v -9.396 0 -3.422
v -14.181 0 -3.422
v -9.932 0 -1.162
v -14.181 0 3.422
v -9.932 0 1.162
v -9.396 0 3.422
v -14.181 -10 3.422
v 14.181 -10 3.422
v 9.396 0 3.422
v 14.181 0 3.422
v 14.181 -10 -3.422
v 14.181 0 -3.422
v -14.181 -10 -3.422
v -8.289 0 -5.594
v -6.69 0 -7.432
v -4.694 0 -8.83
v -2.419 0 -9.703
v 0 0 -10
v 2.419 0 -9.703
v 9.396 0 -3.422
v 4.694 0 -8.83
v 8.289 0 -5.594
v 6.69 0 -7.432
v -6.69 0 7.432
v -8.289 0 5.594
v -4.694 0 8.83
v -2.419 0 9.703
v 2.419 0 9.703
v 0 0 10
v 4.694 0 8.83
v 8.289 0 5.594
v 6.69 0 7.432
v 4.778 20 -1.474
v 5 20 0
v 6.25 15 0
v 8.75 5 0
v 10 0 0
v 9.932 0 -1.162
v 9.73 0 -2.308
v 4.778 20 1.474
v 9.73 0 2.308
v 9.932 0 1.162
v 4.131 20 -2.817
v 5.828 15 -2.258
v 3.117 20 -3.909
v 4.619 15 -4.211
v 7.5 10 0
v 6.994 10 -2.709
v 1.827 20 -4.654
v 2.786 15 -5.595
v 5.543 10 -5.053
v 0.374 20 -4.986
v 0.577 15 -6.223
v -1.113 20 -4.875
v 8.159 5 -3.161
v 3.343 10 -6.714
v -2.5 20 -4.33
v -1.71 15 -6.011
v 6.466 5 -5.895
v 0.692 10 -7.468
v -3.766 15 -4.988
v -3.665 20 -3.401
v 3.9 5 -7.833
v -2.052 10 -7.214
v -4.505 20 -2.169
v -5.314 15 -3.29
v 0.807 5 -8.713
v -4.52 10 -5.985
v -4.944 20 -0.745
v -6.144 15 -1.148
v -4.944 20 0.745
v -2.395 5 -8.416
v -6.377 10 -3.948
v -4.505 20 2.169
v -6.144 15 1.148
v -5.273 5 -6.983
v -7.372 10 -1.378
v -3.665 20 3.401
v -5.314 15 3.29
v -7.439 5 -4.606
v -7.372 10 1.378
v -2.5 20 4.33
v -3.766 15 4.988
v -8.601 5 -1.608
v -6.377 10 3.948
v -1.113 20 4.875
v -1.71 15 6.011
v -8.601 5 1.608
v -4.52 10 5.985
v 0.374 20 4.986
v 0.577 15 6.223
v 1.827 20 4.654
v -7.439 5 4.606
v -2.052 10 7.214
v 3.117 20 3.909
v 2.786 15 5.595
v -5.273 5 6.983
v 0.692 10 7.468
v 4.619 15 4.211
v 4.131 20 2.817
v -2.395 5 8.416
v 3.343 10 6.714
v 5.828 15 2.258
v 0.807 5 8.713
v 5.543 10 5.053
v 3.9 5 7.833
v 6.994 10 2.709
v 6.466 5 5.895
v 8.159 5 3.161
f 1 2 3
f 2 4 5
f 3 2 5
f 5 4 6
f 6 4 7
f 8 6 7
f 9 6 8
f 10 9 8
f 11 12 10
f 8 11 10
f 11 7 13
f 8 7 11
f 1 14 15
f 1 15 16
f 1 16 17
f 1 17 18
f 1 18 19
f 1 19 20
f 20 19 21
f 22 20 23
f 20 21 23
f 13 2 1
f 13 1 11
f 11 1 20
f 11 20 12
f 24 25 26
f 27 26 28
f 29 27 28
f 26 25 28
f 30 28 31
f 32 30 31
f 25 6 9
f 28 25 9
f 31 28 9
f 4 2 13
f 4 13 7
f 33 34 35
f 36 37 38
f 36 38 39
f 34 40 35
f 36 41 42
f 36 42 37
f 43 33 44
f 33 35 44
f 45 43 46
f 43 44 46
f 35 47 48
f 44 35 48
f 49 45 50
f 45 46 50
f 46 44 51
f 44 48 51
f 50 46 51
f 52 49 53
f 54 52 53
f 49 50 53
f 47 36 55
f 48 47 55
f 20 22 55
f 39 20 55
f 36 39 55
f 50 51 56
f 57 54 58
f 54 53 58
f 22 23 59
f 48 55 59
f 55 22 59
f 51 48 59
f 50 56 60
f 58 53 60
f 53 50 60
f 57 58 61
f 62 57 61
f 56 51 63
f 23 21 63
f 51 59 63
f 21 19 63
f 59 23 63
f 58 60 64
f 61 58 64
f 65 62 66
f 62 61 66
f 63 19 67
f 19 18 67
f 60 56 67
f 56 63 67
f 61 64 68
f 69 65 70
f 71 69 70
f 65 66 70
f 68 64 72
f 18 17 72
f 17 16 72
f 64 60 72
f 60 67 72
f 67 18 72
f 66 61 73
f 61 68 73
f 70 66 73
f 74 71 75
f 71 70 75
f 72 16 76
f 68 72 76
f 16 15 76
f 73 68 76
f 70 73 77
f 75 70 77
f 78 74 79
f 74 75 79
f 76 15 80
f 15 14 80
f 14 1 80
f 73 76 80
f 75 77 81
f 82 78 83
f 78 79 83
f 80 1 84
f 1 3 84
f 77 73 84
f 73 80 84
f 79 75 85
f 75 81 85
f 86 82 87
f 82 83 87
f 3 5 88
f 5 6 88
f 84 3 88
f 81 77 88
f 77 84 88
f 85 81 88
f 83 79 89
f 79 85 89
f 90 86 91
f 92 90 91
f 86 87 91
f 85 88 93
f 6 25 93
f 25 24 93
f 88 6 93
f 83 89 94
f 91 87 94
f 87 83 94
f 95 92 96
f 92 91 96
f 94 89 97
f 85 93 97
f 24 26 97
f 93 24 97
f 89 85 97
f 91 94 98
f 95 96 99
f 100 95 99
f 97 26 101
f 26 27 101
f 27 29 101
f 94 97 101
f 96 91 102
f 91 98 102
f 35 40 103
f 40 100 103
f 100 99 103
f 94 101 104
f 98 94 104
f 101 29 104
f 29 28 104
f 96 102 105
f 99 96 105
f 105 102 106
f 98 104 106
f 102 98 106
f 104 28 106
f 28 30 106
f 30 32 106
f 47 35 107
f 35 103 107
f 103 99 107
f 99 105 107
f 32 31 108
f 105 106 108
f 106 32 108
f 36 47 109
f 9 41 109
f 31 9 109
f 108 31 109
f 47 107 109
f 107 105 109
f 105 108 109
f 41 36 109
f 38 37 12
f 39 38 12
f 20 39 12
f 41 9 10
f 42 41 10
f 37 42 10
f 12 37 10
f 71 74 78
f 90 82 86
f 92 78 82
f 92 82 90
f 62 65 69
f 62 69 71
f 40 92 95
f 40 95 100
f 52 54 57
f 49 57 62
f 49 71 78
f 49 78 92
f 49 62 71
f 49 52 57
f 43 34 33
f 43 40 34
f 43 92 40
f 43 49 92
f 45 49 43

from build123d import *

# Parameters (mm, degrees)
SKETCH2_R           = 5
SKETCH1_R           = 10
SKETCH3_W           = 28.361759846
SKETCH3_H           = 6.844946114
BOSS_EXTRUDE1_DEPTH = 10


with BuildPart() as part:
    # Sketch2 → Loft1 section 0
    with BuildSketch(Plane(origin=(0, 20, 0), x_dir=(1, 0, 0), z_dir=(0, 1, 0))):
        Circle(SKETCH2_R)
    # Sketch1 → Loft1 section 1
    with BuildSketch(Plane(origin=(0, 0, 0), x_dir=(1, 0, 0), z_dir=(0, 1, 0))):
        Circle(SKETCH1_R)
    loft()

    # Sketch3 → Boss-Extrude1 (add)
    with BuildSketch(Plane.XZ):
        Rectangle(SKETCH3_W, SKETCH3_H)
    extrude(amount=BOSS_EXTRUDE1_DEPTH)


solid = part.part
